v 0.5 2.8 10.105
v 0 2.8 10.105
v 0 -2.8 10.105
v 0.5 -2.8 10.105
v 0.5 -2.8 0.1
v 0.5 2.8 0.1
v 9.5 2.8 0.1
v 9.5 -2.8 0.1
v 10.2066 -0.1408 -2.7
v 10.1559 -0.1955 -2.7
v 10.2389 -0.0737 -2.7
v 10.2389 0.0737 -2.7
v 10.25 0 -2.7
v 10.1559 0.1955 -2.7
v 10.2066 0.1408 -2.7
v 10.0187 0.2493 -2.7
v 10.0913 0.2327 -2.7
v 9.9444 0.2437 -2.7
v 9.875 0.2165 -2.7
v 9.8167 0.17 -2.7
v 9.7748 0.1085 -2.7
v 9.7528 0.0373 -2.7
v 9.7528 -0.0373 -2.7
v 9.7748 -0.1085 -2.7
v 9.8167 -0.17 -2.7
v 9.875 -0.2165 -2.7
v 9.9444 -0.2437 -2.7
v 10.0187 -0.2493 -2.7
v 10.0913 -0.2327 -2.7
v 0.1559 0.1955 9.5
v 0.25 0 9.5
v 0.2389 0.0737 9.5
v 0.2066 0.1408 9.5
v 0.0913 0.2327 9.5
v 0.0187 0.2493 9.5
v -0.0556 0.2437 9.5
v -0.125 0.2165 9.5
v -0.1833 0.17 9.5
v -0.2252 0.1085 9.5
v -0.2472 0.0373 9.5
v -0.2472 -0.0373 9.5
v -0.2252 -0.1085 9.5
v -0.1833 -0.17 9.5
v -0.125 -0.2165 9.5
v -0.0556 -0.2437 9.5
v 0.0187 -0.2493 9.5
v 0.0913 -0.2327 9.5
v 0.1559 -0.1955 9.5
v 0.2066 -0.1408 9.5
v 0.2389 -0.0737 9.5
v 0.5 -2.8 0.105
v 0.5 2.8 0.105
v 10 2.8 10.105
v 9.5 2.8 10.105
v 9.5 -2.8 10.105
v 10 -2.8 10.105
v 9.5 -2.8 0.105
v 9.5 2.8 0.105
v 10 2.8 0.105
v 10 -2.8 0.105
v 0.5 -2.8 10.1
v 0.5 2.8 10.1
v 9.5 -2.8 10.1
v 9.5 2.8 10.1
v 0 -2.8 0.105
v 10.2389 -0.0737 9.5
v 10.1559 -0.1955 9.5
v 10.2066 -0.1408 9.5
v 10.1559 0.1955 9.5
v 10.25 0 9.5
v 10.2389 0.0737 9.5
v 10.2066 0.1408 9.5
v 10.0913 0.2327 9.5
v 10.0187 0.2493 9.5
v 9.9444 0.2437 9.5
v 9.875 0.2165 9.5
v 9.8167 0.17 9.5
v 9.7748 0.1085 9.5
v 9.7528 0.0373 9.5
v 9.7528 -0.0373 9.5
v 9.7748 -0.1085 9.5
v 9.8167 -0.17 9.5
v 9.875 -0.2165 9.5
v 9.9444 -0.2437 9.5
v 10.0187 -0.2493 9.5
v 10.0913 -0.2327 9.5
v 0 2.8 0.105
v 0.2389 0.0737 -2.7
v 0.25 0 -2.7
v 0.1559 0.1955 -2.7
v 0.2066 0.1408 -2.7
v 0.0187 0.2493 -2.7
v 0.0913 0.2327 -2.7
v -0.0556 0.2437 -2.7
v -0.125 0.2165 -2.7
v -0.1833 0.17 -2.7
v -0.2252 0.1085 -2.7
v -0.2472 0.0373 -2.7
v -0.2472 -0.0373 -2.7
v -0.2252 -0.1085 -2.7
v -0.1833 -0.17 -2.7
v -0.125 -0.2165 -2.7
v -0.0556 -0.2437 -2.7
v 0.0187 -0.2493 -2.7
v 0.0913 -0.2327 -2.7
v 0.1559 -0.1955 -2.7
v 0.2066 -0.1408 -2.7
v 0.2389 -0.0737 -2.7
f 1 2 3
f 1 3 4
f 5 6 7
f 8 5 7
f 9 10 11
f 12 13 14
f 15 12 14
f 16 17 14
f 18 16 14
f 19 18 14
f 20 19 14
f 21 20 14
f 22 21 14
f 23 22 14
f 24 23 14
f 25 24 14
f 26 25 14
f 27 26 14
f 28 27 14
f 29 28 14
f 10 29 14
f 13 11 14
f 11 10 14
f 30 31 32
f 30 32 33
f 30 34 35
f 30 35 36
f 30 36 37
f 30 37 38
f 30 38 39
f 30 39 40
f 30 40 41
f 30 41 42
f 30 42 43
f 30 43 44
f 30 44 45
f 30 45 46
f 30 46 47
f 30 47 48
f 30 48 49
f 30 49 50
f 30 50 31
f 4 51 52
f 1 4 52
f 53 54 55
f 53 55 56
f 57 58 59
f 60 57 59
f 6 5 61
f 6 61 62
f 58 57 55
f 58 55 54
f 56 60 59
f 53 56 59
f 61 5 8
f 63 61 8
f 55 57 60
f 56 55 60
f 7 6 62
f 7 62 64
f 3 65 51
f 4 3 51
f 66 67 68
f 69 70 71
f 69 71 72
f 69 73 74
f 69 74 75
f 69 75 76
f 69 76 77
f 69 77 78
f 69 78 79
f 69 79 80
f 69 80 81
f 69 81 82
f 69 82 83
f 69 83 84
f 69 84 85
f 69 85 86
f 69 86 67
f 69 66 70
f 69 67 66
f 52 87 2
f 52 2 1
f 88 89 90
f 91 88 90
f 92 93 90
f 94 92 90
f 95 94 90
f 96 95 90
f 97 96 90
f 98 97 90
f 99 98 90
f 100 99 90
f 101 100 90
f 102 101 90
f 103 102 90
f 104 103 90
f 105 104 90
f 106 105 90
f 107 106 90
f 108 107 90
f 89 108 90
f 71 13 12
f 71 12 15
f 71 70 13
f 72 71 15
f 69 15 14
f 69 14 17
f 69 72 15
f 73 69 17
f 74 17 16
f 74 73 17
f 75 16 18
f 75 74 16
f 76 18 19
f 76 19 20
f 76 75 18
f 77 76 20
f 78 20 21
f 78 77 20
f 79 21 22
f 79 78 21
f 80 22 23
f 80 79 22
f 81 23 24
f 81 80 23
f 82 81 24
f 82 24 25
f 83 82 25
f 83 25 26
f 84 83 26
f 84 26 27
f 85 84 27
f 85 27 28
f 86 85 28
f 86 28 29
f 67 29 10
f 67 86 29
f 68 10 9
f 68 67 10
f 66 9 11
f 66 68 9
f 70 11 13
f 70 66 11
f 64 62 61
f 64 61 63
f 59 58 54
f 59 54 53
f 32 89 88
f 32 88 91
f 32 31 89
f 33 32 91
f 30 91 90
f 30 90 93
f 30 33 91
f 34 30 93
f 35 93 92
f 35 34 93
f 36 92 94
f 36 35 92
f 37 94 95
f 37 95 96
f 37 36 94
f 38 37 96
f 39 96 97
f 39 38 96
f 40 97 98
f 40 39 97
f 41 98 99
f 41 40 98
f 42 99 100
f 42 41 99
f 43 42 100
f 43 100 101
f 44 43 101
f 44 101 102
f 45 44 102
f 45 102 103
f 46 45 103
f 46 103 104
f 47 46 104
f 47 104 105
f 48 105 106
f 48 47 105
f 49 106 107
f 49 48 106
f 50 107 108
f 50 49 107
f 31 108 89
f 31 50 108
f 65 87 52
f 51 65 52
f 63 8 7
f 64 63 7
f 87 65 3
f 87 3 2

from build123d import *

# Parameters (mm, degrees)
SKETCH_W          = 9
SKETCH_H          = 5.6
PAD_DEPTH         = 10
SKETCH001_R       = 0.25
PAD001_DEPTH      = 9
PAD001_DEPTH_BACK = 3.2
SKETCH002_W       = 0.5
SKETCH002_H       = 5.6
PAD002_DEPTH      = 10


with BuildPart() as pad:
    # Sketch → Pad (new body)
    with BuildSketch(Plane.XY.offset(0.1)):
        with Locations((5, 0)):
            Rectangle(SKETCH_W, SKETCH_H)
    extrude(amount=PAD_DEPTH)


with BuildPart() as pad001:
    # Sketch001 → Pad001 (new body, two sides)
    with BuildSketch(Plane.XY.offset(0.5)) as pad001_sk:
        Circle(SKETCH001_R)
        with Locations((10, 0)):
            Circle(SKETCH001_R)
    extrude(amount=PAD001_DEPTH)
    extrude(pad001_sk.sketch, amount=-PAD001_DEPTH_BACK)


with BuildPart() as pad002:
    # Sketch002 → Pad002 (new body)
    with BuildSketch(Plane.XY.offset(0.105)):
        with Locations((0.25, 0)):
            Rectangle(SKETCH002_W, SKETCH002_H)
        with Locations((9.75, 0)):
            Rectangle(SKETCH002_W, SKETCH002_H)
    extrude(amount=PAD002_DEPTH)


solid = Compound([pad.part, pad001.part, pad002.part])
